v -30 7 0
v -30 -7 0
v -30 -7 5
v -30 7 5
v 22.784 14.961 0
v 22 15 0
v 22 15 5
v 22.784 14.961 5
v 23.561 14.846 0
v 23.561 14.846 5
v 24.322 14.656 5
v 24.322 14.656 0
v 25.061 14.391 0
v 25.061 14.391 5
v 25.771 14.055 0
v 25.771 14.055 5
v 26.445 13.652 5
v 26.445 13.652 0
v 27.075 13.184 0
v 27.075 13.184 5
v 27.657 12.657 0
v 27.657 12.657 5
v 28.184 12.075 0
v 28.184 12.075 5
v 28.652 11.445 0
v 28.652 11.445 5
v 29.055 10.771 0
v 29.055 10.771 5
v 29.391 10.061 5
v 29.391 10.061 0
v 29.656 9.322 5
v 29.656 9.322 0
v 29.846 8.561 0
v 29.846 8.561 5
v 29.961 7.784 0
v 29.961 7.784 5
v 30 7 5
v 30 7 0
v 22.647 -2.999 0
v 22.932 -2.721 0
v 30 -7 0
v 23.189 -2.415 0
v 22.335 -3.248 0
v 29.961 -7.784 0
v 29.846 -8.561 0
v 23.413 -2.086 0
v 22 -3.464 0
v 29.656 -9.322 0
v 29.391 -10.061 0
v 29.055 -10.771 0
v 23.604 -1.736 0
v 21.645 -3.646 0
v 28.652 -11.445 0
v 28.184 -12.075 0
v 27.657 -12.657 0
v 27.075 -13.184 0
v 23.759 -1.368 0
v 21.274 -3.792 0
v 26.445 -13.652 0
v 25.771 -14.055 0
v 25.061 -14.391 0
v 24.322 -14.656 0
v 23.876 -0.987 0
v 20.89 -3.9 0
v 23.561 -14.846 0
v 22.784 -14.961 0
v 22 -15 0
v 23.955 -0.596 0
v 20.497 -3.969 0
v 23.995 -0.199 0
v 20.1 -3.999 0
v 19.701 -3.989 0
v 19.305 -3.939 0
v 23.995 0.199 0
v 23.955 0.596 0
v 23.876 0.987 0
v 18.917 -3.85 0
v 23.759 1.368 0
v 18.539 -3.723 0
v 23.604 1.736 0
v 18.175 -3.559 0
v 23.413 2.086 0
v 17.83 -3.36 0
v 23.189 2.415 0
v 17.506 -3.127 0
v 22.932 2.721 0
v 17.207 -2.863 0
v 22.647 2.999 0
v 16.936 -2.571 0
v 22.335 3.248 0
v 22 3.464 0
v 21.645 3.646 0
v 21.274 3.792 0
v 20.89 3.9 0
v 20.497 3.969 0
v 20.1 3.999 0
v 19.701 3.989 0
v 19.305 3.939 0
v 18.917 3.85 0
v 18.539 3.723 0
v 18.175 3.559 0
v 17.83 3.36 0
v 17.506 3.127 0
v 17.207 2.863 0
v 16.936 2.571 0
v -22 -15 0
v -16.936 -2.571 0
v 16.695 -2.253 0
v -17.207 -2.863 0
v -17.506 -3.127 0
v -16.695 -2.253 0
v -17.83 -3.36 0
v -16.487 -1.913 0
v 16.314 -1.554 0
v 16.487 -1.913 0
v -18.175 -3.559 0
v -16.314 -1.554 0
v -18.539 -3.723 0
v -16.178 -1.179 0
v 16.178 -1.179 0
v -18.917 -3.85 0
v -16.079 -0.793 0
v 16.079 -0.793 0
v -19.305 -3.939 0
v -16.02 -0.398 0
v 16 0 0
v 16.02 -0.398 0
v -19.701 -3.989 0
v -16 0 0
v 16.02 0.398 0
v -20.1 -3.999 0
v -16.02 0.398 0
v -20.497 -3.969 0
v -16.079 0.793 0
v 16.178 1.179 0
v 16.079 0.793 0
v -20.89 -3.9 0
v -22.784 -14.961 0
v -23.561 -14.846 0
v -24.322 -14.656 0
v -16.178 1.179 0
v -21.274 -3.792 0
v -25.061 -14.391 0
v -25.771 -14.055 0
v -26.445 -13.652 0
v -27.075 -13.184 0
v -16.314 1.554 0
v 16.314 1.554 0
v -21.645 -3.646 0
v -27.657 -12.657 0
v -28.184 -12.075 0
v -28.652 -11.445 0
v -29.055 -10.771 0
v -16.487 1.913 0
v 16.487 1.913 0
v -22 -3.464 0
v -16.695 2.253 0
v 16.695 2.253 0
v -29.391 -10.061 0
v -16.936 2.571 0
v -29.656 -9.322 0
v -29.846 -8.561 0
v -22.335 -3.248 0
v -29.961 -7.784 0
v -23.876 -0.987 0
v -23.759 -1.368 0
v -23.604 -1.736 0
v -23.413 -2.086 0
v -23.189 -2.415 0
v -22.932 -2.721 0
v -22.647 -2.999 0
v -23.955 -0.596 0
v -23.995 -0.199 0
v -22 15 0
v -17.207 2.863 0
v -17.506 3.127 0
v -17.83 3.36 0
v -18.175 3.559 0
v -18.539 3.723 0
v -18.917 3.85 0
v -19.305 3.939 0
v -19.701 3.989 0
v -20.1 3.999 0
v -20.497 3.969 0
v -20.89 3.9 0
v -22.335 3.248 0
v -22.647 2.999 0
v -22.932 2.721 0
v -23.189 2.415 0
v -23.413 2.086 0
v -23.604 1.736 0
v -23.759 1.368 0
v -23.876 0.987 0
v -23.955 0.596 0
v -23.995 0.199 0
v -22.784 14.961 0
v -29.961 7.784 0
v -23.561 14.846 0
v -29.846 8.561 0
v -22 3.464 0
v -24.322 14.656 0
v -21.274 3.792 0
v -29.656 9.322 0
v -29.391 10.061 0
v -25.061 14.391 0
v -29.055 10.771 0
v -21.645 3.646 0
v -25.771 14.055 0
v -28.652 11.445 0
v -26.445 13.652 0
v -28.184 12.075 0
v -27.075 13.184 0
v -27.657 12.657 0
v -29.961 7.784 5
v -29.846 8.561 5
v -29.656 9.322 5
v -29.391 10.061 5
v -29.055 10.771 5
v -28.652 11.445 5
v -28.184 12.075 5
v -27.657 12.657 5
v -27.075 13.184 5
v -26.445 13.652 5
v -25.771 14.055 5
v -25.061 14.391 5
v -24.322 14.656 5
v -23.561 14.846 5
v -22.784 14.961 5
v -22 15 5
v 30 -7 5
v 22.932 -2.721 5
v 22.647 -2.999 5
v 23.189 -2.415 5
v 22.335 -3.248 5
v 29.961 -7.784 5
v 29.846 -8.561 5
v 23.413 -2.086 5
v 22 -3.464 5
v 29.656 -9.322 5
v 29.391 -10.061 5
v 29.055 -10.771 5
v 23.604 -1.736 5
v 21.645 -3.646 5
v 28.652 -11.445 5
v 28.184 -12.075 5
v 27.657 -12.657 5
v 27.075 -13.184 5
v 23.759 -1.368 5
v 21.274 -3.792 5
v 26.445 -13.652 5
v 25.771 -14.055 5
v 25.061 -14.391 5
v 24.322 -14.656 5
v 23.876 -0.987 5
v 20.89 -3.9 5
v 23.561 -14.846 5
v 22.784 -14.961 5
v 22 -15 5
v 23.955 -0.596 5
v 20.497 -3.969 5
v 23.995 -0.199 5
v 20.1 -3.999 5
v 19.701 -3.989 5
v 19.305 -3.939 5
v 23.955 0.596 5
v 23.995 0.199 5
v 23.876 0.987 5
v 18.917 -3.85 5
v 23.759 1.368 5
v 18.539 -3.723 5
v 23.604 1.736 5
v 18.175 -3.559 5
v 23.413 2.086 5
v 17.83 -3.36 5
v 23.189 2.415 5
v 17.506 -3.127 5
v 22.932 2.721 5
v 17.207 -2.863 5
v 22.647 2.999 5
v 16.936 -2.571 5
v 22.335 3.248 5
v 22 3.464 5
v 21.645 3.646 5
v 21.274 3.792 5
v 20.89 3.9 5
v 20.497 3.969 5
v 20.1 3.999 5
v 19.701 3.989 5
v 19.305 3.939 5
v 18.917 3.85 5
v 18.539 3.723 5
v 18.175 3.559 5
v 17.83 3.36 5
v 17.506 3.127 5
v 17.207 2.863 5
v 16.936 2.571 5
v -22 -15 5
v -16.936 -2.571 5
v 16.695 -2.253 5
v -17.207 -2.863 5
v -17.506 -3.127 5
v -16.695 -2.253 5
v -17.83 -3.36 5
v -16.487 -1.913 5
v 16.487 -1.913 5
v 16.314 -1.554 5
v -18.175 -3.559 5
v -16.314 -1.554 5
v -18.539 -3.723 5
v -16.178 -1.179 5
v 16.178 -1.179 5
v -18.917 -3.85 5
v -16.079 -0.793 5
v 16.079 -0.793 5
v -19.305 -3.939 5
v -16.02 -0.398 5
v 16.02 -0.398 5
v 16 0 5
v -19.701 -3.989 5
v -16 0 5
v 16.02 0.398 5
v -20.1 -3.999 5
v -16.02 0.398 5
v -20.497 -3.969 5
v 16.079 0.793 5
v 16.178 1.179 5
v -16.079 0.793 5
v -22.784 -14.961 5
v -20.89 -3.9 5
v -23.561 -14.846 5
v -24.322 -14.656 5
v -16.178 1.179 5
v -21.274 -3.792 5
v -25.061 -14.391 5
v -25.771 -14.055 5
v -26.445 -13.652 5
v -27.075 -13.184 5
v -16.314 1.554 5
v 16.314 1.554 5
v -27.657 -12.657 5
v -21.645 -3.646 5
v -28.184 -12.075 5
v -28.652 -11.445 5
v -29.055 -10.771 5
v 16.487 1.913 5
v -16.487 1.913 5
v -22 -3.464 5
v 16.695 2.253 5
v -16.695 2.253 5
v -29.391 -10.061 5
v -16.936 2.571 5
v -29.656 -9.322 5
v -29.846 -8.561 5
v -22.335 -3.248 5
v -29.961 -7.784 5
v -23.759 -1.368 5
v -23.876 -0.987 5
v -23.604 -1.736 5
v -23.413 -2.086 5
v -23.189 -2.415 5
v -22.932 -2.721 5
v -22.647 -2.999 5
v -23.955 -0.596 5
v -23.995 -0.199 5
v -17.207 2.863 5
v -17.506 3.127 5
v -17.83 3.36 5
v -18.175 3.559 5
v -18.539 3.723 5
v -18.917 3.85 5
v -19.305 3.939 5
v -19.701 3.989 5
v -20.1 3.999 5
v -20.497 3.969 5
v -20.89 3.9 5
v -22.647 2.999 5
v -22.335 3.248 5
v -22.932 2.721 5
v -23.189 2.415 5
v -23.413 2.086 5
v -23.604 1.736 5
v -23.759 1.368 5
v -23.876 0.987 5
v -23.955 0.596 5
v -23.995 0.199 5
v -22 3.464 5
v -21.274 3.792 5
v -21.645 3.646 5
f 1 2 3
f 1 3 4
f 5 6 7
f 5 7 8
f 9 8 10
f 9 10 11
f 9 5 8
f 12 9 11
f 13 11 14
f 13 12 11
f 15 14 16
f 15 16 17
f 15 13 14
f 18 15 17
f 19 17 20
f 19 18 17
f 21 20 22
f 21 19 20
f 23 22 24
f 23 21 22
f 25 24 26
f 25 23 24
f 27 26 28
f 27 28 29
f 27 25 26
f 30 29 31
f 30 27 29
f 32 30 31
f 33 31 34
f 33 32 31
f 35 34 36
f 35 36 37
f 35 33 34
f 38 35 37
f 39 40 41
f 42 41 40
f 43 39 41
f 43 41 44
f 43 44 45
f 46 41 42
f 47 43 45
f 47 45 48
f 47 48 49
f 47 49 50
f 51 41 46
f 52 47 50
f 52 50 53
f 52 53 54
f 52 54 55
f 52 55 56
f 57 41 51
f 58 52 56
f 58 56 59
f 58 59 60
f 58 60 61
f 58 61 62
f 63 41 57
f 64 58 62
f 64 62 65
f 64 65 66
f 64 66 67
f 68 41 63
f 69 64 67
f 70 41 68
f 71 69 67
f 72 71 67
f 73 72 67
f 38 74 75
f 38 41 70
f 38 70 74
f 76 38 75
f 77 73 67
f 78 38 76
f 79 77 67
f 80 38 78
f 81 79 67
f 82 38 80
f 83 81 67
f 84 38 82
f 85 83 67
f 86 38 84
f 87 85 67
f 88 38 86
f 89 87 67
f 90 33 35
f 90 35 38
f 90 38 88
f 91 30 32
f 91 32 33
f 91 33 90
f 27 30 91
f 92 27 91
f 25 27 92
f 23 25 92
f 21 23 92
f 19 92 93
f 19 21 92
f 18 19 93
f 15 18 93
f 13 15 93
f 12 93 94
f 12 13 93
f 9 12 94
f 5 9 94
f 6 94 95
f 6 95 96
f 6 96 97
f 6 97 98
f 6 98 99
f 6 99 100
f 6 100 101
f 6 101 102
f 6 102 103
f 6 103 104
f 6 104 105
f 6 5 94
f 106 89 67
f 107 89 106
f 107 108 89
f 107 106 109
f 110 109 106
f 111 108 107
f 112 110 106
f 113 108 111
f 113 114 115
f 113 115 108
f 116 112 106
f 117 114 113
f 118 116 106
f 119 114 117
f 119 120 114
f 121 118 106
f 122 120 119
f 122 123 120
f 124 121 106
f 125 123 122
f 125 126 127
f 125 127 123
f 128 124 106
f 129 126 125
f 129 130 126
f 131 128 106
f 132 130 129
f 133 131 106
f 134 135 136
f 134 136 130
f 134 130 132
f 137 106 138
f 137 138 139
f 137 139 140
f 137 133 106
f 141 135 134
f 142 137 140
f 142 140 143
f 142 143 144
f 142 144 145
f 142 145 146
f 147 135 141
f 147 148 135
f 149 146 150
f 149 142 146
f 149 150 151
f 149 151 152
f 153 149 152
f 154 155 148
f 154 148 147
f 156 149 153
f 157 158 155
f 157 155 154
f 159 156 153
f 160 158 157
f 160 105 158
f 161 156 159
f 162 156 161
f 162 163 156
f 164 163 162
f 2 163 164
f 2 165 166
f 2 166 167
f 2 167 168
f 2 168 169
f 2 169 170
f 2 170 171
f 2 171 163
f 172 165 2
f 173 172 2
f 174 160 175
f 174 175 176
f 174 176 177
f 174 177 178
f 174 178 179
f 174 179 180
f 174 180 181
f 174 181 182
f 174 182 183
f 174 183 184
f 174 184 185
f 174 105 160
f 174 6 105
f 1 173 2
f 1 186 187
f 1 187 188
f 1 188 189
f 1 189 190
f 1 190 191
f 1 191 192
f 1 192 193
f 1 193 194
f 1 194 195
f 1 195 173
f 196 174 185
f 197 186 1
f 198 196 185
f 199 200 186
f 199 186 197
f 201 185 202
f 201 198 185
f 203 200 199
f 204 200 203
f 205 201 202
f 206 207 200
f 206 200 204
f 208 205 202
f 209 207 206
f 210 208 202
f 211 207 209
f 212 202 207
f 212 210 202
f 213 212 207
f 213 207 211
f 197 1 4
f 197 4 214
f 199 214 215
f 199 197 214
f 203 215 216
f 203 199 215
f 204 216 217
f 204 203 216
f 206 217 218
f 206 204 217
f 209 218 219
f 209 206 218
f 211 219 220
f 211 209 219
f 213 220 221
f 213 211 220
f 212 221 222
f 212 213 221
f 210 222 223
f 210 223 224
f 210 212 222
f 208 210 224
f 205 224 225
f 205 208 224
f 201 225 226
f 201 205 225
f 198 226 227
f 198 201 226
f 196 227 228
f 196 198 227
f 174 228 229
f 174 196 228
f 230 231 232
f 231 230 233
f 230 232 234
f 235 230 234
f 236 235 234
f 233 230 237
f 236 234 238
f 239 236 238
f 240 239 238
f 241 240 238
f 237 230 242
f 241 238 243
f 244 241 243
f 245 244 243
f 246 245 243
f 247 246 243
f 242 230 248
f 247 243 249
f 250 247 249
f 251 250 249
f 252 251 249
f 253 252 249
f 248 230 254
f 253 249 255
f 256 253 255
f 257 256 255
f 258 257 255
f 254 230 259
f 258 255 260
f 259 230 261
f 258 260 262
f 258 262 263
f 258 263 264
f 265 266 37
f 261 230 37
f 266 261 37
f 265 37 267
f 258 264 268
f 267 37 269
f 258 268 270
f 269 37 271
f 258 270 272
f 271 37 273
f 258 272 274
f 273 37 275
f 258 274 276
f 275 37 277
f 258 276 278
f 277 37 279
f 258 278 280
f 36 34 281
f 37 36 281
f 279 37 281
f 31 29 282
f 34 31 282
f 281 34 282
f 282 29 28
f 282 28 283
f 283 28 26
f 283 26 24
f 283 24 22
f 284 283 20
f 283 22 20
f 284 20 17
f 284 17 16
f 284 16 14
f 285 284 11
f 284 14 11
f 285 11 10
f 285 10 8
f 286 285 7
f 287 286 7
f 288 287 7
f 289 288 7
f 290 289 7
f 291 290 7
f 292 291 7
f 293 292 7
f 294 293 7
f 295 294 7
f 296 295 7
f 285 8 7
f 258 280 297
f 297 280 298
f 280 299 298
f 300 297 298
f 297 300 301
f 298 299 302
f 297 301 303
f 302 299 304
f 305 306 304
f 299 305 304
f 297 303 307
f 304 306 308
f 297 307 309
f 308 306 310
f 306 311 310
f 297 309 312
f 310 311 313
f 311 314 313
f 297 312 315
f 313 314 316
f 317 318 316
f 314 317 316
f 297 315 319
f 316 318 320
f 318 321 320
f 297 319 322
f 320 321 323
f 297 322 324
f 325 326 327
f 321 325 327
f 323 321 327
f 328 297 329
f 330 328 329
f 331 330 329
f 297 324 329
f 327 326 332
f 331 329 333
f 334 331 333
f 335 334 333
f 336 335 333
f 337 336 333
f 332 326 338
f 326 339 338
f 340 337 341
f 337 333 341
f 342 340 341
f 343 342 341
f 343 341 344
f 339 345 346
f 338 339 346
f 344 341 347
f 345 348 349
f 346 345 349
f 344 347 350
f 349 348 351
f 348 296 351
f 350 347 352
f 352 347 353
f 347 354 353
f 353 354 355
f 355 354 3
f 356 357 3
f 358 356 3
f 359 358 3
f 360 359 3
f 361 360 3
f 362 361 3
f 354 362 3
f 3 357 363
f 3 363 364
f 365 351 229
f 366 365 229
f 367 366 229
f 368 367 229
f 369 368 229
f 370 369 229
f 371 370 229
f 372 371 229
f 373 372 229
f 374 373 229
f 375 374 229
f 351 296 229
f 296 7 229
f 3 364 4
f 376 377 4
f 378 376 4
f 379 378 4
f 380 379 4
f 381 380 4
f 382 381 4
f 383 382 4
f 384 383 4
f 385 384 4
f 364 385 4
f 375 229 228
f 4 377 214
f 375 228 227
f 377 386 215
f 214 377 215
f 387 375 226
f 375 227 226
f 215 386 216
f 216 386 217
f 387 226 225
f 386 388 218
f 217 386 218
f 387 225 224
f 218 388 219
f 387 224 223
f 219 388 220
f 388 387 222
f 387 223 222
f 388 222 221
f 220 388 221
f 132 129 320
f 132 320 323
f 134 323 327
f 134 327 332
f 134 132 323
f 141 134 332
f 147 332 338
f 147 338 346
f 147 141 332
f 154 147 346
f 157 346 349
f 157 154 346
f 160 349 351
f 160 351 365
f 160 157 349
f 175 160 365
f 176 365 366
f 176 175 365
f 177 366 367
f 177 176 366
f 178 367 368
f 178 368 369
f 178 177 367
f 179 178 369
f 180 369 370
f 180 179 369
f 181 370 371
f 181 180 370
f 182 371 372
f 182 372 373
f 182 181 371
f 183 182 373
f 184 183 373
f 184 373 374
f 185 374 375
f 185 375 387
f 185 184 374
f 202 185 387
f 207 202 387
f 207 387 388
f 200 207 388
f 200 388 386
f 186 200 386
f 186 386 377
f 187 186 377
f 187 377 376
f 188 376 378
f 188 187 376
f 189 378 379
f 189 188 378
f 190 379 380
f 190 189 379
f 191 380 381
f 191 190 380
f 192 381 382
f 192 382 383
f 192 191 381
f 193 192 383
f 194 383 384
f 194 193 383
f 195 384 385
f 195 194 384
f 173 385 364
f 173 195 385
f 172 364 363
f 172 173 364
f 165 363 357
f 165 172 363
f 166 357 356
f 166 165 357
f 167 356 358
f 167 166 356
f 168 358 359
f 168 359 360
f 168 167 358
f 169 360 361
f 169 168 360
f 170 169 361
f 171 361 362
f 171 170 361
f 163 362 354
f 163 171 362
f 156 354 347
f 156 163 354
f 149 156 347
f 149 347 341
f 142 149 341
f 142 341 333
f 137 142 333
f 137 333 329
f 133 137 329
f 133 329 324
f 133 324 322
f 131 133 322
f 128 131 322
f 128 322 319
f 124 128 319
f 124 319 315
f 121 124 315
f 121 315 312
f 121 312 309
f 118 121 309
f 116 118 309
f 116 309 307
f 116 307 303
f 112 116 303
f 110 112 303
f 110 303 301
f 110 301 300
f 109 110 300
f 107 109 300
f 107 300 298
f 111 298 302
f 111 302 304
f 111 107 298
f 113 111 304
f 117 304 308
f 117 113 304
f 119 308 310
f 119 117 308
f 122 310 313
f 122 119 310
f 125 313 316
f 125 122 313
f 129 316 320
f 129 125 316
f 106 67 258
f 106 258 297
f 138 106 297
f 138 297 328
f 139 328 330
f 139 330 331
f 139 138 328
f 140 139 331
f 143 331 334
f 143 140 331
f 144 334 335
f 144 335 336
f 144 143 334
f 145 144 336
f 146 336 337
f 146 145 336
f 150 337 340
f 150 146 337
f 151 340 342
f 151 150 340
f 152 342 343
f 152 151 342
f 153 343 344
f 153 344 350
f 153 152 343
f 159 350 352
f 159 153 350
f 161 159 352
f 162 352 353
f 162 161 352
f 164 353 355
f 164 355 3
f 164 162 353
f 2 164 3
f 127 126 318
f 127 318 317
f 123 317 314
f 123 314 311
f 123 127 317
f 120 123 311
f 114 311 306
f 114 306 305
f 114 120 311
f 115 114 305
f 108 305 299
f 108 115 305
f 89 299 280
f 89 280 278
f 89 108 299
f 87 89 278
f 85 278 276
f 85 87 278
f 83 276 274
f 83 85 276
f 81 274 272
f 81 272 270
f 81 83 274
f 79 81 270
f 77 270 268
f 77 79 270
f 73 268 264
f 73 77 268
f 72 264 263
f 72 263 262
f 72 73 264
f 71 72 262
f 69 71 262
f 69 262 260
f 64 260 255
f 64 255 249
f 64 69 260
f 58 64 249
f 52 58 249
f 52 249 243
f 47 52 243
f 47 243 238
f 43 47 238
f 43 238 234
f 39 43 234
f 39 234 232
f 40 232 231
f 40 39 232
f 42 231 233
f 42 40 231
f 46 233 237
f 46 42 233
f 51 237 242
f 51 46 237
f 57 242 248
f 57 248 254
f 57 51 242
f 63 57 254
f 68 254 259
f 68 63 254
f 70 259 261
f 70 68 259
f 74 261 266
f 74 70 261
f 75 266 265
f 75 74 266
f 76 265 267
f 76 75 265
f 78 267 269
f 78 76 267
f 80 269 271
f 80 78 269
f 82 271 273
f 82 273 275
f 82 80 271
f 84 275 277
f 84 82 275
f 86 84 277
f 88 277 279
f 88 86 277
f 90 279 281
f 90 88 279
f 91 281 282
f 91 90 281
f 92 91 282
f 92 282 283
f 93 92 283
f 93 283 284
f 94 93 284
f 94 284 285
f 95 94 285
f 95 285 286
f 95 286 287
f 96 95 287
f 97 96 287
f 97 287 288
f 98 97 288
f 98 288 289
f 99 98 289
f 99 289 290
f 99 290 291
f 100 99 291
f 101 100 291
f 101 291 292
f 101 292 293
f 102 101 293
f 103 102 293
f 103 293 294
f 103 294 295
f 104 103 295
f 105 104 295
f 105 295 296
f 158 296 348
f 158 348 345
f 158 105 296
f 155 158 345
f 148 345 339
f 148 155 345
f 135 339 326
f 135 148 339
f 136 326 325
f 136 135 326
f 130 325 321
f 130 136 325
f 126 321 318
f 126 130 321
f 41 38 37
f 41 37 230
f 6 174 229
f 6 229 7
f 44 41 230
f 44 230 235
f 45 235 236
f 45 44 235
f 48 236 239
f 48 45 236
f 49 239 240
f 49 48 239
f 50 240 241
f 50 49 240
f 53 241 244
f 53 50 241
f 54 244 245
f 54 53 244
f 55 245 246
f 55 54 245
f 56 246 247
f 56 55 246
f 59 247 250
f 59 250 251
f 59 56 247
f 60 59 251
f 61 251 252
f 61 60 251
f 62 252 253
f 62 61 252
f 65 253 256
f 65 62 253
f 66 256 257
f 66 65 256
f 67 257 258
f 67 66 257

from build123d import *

# Parameters (mm, degrees)
SKETCH1_R           = 4
BOSS_EXTRUDE1_DEPTH = 5


with BuildPart() as part:
    # Sketch1 → Boss-Extrude1 (new body)
    with BuildSketch(Plane.XY):
        with BuildLine():
            Line((22, -15), (-22, -15))
            ThreePointArc((-22, -15), (-27.656854249, -12.656854249), (-30, -7))
            Line((-30, -7), (-30, 7))
            ThreePointArc((-30, 7), (-27.656854249, 12.656854249), (-22, 15))
            Line((-22, 15), (22, 15))
            ThreePointArc((22, 15), (27.656854249, 12.656854249), (30, 7))
            Line((30, 7), (30, -7))
            ThreePointArc((30, -7), (27.656854249, -12.656854249), (22, -15))
        make_face()
        with Locations((-20, 0)):
            Circle(SKETCH1_R, mode=Mode.SUBTRACT)
        with Locations(Location((20, 0, 0), (0, 0, 180))):
            Circle(SKETCH1_R, mode=Mode.SUBTRACT)
    extrude(amount=BOSS_EXTRUDE1_DEPTH)


solid = part.part
